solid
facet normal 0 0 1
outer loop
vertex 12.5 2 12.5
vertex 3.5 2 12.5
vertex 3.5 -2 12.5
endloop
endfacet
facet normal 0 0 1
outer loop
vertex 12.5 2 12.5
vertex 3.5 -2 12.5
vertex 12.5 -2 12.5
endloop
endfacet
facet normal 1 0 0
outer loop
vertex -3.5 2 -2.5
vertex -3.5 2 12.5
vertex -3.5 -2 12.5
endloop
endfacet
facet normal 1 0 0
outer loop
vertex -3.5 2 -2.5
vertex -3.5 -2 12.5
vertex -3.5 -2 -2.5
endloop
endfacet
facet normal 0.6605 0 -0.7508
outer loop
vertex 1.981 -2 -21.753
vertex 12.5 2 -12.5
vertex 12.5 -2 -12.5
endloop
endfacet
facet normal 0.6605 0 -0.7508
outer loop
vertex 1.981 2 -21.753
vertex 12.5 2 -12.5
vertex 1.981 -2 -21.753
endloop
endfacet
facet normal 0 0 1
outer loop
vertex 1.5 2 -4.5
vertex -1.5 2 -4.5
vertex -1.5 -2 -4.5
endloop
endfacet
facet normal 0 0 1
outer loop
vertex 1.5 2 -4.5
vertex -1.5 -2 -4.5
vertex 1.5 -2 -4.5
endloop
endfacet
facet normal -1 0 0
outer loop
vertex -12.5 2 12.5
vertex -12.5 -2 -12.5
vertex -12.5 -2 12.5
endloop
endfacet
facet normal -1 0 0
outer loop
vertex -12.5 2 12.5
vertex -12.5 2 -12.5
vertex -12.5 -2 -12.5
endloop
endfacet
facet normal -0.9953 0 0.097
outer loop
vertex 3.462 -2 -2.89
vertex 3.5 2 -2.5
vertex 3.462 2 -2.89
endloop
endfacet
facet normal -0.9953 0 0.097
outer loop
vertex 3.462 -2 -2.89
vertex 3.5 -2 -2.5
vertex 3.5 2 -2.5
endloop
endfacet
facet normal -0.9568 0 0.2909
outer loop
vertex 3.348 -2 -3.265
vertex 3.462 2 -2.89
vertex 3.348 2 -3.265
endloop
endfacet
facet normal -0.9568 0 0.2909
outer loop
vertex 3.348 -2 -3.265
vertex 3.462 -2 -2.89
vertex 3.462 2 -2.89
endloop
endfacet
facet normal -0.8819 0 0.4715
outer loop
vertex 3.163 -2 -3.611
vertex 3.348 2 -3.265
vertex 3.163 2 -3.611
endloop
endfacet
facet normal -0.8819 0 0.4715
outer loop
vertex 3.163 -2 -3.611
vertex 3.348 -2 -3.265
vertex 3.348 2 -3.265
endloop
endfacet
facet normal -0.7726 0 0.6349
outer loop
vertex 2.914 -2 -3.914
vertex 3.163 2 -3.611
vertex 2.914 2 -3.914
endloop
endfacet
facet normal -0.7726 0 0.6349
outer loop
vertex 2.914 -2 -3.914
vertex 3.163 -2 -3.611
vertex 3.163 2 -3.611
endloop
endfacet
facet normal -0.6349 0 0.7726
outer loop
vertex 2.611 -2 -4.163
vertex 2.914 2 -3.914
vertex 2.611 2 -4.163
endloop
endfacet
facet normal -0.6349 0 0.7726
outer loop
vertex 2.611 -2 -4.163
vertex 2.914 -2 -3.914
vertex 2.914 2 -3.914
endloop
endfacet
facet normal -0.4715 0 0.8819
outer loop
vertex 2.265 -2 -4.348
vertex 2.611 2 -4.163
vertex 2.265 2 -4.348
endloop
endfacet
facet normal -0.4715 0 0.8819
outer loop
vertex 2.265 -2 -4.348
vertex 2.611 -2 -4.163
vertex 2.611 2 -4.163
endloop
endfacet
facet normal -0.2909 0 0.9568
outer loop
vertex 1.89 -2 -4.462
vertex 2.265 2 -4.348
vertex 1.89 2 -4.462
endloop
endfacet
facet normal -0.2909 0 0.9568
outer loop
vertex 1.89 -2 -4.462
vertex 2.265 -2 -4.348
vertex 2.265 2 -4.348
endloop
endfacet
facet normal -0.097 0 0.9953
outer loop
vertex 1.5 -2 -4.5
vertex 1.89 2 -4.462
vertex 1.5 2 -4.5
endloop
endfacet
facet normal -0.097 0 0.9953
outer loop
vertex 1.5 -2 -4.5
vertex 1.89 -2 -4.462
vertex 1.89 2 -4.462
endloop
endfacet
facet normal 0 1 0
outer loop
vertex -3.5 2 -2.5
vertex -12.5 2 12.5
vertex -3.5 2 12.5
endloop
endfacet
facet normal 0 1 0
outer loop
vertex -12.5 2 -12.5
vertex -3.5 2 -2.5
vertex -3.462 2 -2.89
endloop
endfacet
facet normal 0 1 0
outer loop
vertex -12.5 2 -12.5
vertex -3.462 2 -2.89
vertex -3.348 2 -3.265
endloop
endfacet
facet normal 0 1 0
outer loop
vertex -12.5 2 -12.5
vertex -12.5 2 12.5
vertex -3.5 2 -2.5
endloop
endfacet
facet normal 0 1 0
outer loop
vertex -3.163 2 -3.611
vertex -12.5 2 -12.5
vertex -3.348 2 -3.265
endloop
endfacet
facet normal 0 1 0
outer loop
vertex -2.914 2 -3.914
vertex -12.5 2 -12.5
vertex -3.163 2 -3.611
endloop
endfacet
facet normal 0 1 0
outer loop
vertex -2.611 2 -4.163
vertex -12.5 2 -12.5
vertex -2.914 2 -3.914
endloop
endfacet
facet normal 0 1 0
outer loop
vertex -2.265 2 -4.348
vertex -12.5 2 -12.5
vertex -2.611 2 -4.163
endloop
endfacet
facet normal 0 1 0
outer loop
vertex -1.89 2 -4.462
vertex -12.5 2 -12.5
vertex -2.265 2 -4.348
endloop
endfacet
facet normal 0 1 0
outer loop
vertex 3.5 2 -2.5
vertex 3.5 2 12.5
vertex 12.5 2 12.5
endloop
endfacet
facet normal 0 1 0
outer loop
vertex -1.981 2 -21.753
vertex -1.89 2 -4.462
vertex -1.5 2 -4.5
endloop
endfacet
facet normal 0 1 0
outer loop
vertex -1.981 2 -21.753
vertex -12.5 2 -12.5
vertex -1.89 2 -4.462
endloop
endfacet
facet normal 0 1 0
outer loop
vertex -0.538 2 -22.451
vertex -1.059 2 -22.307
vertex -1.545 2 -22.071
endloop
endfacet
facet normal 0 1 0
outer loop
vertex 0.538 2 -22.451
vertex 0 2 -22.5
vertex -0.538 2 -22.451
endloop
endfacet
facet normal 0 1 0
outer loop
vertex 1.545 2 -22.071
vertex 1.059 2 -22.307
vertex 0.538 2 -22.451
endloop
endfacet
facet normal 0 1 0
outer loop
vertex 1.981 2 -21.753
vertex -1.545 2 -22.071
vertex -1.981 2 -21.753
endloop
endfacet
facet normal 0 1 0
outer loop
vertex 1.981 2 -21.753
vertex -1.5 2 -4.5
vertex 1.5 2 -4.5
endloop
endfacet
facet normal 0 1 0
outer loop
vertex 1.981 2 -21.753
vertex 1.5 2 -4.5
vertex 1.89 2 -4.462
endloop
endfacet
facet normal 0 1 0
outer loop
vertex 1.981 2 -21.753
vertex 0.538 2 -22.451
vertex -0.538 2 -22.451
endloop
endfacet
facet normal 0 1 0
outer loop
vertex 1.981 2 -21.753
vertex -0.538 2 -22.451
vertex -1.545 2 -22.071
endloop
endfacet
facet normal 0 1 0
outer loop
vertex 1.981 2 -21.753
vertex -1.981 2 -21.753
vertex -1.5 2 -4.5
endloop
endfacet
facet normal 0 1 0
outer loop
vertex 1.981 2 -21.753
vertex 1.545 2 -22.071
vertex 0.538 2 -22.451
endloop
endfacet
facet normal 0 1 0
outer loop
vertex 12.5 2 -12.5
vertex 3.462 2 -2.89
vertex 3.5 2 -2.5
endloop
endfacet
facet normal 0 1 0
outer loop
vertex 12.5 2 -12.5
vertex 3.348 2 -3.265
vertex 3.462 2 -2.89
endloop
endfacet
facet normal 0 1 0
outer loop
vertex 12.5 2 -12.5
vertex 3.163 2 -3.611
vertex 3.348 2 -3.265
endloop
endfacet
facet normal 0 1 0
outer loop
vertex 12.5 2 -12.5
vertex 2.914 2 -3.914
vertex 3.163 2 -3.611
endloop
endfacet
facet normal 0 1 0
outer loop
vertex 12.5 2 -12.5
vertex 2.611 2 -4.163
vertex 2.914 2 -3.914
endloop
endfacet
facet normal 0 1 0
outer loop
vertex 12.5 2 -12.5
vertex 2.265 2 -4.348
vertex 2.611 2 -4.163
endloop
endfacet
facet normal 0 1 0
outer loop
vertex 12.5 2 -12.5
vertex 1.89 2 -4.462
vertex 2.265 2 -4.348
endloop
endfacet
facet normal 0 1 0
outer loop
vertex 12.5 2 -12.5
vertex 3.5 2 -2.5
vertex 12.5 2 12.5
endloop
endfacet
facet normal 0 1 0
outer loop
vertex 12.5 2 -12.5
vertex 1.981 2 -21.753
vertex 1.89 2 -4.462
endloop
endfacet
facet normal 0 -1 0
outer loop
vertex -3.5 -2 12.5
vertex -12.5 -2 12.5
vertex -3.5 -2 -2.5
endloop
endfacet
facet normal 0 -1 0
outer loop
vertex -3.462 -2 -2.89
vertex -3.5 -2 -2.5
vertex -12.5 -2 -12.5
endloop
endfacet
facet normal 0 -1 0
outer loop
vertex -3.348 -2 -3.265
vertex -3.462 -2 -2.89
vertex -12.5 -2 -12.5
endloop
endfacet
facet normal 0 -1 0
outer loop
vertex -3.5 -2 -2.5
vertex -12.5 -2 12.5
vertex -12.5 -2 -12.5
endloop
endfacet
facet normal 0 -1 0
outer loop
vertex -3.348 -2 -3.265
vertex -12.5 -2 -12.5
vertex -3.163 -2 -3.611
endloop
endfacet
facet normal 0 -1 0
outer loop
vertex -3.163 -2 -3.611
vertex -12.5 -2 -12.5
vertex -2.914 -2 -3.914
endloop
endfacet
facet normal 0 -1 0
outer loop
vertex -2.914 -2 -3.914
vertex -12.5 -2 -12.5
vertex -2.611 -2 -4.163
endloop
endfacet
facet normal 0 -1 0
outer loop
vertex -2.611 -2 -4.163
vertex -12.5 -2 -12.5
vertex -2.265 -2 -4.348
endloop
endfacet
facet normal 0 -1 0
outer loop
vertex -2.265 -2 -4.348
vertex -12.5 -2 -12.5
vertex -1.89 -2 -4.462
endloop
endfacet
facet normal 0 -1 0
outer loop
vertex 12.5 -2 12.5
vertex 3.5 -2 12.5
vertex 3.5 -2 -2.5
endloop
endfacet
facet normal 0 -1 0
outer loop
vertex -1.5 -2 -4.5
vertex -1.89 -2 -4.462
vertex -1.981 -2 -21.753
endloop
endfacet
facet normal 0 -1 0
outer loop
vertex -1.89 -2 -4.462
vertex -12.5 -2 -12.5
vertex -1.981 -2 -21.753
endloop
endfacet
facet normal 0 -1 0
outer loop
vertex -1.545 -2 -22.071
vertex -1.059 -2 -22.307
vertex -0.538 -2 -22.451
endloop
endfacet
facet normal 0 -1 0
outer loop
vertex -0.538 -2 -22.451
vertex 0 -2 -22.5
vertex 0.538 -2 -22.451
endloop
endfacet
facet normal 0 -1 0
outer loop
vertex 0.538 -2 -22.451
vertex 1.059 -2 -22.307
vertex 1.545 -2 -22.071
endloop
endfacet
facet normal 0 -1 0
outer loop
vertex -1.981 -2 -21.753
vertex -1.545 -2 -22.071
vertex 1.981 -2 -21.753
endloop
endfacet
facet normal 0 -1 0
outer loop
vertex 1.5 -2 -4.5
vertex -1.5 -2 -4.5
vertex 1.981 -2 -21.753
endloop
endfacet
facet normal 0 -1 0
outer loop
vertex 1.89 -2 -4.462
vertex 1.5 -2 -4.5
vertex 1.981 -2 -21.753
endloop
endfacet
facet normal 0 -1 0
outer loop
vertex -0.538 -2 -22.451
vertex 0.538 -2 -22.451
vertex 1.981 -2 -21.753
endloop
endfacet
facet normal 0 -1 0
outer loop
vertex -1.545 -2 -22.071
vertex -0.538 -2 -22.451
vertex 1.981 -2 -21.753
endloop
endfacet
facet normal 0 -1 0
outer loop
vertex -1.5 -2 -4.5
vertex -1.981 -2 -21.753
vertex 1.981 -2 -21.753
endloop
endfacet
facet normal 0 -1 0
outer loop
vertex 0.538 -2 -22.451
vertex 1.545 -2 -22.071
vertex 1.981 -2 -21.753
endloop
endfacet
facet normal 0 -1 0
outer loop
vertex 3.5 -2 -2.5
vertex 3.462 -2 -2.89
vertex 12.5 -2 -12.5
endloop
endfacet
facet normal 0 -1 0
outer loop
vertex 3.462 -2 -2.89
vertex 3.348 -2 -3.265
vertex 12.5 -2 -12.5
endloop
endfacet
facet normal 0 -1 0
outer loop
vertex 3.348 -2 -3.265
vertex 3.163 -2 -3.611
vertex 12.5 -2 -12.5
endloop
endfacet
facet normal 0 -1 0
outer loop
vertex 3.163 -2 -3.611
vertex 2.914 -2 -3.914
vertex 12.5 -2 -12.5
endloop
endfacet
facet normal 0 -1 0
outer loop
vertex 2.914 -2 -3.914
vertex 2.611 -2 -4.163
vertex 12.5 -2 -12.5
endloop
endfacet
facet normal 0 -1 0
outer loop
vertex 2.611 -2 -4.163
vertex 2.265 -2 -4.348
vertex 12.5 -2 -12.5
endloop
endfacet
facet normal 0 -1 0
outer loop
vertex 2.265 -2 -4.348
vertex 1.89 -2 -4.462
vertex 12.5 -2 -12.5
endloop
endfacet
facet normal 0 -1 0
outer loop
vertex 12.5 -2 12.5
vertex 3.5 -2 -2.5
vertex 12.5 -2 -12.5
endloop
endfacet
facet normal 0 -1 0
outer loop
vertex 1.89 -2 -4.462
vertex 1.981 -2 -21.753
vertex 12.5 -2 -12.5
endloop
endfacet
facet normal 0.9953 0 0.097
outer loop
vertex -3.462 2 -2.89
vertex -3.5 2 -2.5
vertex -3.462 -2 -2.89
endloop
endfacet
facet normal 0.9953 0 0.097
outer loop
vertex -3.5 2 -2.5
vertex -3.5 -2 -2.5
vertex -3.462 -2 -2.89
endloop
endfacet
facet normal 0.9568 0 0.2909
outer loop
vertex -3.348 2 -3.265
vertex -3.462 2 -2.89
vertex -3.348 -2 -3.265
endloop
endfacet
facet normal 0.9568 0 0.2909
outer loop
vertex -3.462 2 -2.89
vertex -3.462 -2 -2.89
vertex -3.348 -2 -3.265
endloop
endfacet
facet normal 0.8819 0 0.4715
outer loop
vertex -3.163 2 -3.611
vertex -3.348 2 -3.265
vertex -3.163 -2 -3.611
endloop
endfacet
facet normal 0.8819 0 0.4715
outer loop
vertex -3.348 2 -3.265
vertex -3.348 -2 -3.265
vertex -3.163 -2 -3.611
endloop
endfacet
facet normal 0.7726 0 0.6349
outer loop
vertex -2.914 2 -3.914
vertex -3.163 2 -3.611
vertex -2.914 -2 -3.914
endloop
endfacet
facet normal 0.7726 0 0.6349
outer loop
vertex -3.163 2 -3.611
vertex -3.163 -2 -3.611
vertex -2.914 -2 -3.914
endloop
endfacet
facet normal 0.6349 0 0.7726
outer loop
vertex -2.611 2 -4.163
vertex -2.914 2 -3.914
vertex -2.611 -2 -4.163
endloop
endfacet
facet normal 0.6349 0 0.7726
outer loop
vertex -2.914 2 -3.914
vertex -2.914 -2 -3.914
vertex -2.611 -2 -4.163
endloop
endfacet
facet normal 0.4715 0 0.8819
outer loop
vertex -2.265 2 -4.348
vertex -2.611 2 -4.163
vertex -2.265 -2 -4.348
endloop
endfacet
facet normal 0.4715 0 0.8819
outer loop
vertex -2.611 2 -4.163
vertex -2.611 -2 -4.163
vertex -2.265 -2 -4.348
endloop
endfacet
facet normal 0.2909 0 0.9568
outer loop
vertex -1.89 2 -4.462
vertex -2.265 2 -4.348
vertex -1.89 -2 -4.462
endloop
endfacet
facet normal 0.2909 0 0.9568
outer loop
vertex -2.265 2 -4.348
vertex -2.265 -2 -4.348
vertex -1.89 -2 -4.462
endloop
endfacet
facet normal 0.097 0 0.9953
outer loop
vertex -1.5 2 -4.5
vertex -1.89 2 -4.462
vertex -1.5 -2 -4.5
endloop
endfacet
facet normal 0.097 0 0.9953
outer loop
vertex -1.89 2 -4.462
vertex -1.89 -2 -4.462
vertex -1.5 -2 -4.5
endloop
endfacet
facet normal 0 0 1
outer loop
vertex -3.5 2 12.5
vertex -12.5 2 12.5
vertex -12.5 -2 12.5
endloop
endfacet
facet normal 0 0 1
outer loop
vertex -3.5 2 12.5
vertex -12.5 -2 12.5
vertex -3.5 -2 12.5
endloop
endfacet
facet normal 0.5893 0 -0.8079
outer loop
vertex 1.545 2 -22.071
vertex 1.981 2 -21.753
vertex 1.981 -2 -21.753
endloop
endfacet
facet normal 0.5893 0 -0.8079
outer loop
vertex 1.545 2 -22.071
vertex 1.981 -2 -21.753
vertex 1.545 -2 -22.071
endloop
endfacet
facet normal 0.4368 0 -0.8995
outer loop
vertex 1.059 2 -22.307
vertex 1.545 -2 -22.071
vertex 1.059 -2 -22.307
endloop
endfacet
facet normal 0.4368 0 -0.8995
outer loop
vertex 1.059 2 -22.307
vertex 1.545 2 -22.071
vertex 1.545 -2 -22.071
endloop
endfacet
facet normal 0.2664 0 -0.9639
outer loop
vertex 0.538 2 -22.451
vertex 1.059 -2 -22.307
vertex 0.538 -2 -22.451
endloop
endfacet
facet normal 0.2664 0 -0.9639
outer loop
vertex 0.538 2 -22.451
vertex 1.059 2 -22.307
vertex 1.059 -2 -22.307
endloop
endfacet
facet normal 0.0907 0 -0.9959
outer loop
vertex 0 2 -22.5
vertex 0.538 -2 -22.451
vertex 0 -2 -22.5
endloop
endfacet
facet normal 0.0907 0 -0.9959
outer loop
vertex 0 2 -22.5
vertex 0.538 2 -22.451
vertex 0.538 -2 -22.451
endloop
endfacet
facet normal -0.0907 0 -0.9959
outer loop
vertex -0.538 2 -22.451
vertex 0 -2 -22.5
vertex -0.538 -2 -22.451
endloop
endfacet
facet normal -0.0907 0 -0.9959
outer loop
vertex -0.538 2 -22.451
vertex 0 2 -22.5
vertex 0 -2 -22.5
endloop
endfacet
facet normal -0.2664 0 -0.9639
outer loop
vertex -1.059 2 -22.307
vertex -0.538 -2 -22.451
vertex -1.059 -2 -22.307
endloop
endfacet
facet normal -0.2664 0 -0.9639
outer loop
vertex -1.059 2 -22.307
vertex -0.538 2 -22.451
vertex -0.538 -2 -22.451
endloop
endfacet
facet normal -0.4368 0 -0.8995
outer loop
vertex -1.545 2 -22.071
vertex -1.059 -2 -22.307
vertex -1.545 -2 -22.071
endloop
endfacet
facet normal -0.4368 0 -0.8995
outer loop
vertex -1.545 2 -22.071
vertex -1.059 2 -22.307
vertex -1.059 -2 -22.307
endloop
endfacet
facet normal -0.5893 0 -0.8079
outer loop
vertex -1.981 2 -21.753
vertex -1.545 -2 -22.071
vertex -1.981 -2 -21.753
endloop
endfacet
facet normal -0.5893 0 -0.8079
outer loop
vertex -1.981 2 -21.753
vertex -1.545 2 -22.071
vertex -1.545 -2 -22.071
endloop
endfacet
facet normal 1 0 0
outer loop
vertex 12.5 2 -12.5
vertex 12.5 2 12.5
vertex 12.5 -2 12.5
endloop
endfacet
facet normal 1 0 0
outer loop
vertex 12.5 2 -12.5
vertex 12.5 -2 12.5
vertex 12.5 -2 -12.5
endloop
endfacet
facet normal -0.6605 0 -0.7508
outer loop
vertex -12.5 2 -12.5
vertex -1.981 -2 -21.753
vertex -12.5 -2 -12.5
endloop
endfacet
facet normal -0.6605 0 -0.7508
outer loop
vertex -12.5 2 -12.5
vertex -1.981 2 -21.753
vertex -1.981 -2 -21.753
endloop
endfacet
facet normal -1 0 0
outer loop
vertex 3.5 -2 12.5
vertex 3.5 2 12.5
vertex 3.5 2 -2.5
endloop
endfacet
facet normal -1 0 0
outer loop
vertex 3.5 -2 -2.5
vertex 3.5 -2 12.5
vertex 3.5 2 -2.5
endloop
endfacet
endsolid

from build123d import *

# Parameters (mm, degrees)
BOSS_EXTRUDE1_DEPTH = 2
CUT_EXTRUDE1_REACH  = 28.048
SKETCH2_W           = 7
SKETCH2_H           = 17
FILLET1_R           = 2


with BuildPart() as part:
    # Sketch1 → Boss-Extrude1 (new, symmetric)
    with BuildSketch(Plane(origin=(0, 0, 0), x_dir=(1, 0, 0), z_dir=(0, 1, 0))):
        with BuildLine():
            Line((-12.5, -12.5), (12.5, -12.5))
            Line((12.5, -12.5), (12.5, 12.5))
            Line((12.5, 12.5), (1.9814248, 21.752544286))
            ThreePointArc((1.9814248, 21.752544286), (0, 22.5), (-1.9814248, 21.752544286))
            Line((-1.9814248, 21.752544286), (-12.5, 12.5))
            Line((-12.5, 12.5), (-12.5, -12.5))
        make_face()
    extrude(amount=BOSS_EXTRUDE1_DEPTH, both=True)

    # Sketch2 → Cut-Extrude1 (cut, up to next)
    with BuildSketch(Plane(origin=(0, 2, 0), x_dir=(1, 0, 0), z_dir=(0, 1, 0)), mode=Mode.PRIVATE) as cut_extrude1_sk1:
        with Locations((0, -4)):
            Rectangle(SKETCH2_W, SKETCH2_H)
    cut_extrude1_tool1 = extrude(cut_extrude1_sk1.sketch, amount=-CUT_EXTRUDE1_REACH, mode=Mode.PRIVATE) & part.part
    add(cut_extrude1_tool1.solids().sort_by_distance((0, 2, 4))[0], mode=Mode.SUBTRACT)

    # Fillet1
    fillet1_edges = [part.edges().sort_by_distance(p)[0] for p in [
        (-3.5, 0, -4.5),
        (3.5, 0, -4.5),
    ]]
    fillet(fillet1_edges, radius=FILLET1_R)


solid = part.part
